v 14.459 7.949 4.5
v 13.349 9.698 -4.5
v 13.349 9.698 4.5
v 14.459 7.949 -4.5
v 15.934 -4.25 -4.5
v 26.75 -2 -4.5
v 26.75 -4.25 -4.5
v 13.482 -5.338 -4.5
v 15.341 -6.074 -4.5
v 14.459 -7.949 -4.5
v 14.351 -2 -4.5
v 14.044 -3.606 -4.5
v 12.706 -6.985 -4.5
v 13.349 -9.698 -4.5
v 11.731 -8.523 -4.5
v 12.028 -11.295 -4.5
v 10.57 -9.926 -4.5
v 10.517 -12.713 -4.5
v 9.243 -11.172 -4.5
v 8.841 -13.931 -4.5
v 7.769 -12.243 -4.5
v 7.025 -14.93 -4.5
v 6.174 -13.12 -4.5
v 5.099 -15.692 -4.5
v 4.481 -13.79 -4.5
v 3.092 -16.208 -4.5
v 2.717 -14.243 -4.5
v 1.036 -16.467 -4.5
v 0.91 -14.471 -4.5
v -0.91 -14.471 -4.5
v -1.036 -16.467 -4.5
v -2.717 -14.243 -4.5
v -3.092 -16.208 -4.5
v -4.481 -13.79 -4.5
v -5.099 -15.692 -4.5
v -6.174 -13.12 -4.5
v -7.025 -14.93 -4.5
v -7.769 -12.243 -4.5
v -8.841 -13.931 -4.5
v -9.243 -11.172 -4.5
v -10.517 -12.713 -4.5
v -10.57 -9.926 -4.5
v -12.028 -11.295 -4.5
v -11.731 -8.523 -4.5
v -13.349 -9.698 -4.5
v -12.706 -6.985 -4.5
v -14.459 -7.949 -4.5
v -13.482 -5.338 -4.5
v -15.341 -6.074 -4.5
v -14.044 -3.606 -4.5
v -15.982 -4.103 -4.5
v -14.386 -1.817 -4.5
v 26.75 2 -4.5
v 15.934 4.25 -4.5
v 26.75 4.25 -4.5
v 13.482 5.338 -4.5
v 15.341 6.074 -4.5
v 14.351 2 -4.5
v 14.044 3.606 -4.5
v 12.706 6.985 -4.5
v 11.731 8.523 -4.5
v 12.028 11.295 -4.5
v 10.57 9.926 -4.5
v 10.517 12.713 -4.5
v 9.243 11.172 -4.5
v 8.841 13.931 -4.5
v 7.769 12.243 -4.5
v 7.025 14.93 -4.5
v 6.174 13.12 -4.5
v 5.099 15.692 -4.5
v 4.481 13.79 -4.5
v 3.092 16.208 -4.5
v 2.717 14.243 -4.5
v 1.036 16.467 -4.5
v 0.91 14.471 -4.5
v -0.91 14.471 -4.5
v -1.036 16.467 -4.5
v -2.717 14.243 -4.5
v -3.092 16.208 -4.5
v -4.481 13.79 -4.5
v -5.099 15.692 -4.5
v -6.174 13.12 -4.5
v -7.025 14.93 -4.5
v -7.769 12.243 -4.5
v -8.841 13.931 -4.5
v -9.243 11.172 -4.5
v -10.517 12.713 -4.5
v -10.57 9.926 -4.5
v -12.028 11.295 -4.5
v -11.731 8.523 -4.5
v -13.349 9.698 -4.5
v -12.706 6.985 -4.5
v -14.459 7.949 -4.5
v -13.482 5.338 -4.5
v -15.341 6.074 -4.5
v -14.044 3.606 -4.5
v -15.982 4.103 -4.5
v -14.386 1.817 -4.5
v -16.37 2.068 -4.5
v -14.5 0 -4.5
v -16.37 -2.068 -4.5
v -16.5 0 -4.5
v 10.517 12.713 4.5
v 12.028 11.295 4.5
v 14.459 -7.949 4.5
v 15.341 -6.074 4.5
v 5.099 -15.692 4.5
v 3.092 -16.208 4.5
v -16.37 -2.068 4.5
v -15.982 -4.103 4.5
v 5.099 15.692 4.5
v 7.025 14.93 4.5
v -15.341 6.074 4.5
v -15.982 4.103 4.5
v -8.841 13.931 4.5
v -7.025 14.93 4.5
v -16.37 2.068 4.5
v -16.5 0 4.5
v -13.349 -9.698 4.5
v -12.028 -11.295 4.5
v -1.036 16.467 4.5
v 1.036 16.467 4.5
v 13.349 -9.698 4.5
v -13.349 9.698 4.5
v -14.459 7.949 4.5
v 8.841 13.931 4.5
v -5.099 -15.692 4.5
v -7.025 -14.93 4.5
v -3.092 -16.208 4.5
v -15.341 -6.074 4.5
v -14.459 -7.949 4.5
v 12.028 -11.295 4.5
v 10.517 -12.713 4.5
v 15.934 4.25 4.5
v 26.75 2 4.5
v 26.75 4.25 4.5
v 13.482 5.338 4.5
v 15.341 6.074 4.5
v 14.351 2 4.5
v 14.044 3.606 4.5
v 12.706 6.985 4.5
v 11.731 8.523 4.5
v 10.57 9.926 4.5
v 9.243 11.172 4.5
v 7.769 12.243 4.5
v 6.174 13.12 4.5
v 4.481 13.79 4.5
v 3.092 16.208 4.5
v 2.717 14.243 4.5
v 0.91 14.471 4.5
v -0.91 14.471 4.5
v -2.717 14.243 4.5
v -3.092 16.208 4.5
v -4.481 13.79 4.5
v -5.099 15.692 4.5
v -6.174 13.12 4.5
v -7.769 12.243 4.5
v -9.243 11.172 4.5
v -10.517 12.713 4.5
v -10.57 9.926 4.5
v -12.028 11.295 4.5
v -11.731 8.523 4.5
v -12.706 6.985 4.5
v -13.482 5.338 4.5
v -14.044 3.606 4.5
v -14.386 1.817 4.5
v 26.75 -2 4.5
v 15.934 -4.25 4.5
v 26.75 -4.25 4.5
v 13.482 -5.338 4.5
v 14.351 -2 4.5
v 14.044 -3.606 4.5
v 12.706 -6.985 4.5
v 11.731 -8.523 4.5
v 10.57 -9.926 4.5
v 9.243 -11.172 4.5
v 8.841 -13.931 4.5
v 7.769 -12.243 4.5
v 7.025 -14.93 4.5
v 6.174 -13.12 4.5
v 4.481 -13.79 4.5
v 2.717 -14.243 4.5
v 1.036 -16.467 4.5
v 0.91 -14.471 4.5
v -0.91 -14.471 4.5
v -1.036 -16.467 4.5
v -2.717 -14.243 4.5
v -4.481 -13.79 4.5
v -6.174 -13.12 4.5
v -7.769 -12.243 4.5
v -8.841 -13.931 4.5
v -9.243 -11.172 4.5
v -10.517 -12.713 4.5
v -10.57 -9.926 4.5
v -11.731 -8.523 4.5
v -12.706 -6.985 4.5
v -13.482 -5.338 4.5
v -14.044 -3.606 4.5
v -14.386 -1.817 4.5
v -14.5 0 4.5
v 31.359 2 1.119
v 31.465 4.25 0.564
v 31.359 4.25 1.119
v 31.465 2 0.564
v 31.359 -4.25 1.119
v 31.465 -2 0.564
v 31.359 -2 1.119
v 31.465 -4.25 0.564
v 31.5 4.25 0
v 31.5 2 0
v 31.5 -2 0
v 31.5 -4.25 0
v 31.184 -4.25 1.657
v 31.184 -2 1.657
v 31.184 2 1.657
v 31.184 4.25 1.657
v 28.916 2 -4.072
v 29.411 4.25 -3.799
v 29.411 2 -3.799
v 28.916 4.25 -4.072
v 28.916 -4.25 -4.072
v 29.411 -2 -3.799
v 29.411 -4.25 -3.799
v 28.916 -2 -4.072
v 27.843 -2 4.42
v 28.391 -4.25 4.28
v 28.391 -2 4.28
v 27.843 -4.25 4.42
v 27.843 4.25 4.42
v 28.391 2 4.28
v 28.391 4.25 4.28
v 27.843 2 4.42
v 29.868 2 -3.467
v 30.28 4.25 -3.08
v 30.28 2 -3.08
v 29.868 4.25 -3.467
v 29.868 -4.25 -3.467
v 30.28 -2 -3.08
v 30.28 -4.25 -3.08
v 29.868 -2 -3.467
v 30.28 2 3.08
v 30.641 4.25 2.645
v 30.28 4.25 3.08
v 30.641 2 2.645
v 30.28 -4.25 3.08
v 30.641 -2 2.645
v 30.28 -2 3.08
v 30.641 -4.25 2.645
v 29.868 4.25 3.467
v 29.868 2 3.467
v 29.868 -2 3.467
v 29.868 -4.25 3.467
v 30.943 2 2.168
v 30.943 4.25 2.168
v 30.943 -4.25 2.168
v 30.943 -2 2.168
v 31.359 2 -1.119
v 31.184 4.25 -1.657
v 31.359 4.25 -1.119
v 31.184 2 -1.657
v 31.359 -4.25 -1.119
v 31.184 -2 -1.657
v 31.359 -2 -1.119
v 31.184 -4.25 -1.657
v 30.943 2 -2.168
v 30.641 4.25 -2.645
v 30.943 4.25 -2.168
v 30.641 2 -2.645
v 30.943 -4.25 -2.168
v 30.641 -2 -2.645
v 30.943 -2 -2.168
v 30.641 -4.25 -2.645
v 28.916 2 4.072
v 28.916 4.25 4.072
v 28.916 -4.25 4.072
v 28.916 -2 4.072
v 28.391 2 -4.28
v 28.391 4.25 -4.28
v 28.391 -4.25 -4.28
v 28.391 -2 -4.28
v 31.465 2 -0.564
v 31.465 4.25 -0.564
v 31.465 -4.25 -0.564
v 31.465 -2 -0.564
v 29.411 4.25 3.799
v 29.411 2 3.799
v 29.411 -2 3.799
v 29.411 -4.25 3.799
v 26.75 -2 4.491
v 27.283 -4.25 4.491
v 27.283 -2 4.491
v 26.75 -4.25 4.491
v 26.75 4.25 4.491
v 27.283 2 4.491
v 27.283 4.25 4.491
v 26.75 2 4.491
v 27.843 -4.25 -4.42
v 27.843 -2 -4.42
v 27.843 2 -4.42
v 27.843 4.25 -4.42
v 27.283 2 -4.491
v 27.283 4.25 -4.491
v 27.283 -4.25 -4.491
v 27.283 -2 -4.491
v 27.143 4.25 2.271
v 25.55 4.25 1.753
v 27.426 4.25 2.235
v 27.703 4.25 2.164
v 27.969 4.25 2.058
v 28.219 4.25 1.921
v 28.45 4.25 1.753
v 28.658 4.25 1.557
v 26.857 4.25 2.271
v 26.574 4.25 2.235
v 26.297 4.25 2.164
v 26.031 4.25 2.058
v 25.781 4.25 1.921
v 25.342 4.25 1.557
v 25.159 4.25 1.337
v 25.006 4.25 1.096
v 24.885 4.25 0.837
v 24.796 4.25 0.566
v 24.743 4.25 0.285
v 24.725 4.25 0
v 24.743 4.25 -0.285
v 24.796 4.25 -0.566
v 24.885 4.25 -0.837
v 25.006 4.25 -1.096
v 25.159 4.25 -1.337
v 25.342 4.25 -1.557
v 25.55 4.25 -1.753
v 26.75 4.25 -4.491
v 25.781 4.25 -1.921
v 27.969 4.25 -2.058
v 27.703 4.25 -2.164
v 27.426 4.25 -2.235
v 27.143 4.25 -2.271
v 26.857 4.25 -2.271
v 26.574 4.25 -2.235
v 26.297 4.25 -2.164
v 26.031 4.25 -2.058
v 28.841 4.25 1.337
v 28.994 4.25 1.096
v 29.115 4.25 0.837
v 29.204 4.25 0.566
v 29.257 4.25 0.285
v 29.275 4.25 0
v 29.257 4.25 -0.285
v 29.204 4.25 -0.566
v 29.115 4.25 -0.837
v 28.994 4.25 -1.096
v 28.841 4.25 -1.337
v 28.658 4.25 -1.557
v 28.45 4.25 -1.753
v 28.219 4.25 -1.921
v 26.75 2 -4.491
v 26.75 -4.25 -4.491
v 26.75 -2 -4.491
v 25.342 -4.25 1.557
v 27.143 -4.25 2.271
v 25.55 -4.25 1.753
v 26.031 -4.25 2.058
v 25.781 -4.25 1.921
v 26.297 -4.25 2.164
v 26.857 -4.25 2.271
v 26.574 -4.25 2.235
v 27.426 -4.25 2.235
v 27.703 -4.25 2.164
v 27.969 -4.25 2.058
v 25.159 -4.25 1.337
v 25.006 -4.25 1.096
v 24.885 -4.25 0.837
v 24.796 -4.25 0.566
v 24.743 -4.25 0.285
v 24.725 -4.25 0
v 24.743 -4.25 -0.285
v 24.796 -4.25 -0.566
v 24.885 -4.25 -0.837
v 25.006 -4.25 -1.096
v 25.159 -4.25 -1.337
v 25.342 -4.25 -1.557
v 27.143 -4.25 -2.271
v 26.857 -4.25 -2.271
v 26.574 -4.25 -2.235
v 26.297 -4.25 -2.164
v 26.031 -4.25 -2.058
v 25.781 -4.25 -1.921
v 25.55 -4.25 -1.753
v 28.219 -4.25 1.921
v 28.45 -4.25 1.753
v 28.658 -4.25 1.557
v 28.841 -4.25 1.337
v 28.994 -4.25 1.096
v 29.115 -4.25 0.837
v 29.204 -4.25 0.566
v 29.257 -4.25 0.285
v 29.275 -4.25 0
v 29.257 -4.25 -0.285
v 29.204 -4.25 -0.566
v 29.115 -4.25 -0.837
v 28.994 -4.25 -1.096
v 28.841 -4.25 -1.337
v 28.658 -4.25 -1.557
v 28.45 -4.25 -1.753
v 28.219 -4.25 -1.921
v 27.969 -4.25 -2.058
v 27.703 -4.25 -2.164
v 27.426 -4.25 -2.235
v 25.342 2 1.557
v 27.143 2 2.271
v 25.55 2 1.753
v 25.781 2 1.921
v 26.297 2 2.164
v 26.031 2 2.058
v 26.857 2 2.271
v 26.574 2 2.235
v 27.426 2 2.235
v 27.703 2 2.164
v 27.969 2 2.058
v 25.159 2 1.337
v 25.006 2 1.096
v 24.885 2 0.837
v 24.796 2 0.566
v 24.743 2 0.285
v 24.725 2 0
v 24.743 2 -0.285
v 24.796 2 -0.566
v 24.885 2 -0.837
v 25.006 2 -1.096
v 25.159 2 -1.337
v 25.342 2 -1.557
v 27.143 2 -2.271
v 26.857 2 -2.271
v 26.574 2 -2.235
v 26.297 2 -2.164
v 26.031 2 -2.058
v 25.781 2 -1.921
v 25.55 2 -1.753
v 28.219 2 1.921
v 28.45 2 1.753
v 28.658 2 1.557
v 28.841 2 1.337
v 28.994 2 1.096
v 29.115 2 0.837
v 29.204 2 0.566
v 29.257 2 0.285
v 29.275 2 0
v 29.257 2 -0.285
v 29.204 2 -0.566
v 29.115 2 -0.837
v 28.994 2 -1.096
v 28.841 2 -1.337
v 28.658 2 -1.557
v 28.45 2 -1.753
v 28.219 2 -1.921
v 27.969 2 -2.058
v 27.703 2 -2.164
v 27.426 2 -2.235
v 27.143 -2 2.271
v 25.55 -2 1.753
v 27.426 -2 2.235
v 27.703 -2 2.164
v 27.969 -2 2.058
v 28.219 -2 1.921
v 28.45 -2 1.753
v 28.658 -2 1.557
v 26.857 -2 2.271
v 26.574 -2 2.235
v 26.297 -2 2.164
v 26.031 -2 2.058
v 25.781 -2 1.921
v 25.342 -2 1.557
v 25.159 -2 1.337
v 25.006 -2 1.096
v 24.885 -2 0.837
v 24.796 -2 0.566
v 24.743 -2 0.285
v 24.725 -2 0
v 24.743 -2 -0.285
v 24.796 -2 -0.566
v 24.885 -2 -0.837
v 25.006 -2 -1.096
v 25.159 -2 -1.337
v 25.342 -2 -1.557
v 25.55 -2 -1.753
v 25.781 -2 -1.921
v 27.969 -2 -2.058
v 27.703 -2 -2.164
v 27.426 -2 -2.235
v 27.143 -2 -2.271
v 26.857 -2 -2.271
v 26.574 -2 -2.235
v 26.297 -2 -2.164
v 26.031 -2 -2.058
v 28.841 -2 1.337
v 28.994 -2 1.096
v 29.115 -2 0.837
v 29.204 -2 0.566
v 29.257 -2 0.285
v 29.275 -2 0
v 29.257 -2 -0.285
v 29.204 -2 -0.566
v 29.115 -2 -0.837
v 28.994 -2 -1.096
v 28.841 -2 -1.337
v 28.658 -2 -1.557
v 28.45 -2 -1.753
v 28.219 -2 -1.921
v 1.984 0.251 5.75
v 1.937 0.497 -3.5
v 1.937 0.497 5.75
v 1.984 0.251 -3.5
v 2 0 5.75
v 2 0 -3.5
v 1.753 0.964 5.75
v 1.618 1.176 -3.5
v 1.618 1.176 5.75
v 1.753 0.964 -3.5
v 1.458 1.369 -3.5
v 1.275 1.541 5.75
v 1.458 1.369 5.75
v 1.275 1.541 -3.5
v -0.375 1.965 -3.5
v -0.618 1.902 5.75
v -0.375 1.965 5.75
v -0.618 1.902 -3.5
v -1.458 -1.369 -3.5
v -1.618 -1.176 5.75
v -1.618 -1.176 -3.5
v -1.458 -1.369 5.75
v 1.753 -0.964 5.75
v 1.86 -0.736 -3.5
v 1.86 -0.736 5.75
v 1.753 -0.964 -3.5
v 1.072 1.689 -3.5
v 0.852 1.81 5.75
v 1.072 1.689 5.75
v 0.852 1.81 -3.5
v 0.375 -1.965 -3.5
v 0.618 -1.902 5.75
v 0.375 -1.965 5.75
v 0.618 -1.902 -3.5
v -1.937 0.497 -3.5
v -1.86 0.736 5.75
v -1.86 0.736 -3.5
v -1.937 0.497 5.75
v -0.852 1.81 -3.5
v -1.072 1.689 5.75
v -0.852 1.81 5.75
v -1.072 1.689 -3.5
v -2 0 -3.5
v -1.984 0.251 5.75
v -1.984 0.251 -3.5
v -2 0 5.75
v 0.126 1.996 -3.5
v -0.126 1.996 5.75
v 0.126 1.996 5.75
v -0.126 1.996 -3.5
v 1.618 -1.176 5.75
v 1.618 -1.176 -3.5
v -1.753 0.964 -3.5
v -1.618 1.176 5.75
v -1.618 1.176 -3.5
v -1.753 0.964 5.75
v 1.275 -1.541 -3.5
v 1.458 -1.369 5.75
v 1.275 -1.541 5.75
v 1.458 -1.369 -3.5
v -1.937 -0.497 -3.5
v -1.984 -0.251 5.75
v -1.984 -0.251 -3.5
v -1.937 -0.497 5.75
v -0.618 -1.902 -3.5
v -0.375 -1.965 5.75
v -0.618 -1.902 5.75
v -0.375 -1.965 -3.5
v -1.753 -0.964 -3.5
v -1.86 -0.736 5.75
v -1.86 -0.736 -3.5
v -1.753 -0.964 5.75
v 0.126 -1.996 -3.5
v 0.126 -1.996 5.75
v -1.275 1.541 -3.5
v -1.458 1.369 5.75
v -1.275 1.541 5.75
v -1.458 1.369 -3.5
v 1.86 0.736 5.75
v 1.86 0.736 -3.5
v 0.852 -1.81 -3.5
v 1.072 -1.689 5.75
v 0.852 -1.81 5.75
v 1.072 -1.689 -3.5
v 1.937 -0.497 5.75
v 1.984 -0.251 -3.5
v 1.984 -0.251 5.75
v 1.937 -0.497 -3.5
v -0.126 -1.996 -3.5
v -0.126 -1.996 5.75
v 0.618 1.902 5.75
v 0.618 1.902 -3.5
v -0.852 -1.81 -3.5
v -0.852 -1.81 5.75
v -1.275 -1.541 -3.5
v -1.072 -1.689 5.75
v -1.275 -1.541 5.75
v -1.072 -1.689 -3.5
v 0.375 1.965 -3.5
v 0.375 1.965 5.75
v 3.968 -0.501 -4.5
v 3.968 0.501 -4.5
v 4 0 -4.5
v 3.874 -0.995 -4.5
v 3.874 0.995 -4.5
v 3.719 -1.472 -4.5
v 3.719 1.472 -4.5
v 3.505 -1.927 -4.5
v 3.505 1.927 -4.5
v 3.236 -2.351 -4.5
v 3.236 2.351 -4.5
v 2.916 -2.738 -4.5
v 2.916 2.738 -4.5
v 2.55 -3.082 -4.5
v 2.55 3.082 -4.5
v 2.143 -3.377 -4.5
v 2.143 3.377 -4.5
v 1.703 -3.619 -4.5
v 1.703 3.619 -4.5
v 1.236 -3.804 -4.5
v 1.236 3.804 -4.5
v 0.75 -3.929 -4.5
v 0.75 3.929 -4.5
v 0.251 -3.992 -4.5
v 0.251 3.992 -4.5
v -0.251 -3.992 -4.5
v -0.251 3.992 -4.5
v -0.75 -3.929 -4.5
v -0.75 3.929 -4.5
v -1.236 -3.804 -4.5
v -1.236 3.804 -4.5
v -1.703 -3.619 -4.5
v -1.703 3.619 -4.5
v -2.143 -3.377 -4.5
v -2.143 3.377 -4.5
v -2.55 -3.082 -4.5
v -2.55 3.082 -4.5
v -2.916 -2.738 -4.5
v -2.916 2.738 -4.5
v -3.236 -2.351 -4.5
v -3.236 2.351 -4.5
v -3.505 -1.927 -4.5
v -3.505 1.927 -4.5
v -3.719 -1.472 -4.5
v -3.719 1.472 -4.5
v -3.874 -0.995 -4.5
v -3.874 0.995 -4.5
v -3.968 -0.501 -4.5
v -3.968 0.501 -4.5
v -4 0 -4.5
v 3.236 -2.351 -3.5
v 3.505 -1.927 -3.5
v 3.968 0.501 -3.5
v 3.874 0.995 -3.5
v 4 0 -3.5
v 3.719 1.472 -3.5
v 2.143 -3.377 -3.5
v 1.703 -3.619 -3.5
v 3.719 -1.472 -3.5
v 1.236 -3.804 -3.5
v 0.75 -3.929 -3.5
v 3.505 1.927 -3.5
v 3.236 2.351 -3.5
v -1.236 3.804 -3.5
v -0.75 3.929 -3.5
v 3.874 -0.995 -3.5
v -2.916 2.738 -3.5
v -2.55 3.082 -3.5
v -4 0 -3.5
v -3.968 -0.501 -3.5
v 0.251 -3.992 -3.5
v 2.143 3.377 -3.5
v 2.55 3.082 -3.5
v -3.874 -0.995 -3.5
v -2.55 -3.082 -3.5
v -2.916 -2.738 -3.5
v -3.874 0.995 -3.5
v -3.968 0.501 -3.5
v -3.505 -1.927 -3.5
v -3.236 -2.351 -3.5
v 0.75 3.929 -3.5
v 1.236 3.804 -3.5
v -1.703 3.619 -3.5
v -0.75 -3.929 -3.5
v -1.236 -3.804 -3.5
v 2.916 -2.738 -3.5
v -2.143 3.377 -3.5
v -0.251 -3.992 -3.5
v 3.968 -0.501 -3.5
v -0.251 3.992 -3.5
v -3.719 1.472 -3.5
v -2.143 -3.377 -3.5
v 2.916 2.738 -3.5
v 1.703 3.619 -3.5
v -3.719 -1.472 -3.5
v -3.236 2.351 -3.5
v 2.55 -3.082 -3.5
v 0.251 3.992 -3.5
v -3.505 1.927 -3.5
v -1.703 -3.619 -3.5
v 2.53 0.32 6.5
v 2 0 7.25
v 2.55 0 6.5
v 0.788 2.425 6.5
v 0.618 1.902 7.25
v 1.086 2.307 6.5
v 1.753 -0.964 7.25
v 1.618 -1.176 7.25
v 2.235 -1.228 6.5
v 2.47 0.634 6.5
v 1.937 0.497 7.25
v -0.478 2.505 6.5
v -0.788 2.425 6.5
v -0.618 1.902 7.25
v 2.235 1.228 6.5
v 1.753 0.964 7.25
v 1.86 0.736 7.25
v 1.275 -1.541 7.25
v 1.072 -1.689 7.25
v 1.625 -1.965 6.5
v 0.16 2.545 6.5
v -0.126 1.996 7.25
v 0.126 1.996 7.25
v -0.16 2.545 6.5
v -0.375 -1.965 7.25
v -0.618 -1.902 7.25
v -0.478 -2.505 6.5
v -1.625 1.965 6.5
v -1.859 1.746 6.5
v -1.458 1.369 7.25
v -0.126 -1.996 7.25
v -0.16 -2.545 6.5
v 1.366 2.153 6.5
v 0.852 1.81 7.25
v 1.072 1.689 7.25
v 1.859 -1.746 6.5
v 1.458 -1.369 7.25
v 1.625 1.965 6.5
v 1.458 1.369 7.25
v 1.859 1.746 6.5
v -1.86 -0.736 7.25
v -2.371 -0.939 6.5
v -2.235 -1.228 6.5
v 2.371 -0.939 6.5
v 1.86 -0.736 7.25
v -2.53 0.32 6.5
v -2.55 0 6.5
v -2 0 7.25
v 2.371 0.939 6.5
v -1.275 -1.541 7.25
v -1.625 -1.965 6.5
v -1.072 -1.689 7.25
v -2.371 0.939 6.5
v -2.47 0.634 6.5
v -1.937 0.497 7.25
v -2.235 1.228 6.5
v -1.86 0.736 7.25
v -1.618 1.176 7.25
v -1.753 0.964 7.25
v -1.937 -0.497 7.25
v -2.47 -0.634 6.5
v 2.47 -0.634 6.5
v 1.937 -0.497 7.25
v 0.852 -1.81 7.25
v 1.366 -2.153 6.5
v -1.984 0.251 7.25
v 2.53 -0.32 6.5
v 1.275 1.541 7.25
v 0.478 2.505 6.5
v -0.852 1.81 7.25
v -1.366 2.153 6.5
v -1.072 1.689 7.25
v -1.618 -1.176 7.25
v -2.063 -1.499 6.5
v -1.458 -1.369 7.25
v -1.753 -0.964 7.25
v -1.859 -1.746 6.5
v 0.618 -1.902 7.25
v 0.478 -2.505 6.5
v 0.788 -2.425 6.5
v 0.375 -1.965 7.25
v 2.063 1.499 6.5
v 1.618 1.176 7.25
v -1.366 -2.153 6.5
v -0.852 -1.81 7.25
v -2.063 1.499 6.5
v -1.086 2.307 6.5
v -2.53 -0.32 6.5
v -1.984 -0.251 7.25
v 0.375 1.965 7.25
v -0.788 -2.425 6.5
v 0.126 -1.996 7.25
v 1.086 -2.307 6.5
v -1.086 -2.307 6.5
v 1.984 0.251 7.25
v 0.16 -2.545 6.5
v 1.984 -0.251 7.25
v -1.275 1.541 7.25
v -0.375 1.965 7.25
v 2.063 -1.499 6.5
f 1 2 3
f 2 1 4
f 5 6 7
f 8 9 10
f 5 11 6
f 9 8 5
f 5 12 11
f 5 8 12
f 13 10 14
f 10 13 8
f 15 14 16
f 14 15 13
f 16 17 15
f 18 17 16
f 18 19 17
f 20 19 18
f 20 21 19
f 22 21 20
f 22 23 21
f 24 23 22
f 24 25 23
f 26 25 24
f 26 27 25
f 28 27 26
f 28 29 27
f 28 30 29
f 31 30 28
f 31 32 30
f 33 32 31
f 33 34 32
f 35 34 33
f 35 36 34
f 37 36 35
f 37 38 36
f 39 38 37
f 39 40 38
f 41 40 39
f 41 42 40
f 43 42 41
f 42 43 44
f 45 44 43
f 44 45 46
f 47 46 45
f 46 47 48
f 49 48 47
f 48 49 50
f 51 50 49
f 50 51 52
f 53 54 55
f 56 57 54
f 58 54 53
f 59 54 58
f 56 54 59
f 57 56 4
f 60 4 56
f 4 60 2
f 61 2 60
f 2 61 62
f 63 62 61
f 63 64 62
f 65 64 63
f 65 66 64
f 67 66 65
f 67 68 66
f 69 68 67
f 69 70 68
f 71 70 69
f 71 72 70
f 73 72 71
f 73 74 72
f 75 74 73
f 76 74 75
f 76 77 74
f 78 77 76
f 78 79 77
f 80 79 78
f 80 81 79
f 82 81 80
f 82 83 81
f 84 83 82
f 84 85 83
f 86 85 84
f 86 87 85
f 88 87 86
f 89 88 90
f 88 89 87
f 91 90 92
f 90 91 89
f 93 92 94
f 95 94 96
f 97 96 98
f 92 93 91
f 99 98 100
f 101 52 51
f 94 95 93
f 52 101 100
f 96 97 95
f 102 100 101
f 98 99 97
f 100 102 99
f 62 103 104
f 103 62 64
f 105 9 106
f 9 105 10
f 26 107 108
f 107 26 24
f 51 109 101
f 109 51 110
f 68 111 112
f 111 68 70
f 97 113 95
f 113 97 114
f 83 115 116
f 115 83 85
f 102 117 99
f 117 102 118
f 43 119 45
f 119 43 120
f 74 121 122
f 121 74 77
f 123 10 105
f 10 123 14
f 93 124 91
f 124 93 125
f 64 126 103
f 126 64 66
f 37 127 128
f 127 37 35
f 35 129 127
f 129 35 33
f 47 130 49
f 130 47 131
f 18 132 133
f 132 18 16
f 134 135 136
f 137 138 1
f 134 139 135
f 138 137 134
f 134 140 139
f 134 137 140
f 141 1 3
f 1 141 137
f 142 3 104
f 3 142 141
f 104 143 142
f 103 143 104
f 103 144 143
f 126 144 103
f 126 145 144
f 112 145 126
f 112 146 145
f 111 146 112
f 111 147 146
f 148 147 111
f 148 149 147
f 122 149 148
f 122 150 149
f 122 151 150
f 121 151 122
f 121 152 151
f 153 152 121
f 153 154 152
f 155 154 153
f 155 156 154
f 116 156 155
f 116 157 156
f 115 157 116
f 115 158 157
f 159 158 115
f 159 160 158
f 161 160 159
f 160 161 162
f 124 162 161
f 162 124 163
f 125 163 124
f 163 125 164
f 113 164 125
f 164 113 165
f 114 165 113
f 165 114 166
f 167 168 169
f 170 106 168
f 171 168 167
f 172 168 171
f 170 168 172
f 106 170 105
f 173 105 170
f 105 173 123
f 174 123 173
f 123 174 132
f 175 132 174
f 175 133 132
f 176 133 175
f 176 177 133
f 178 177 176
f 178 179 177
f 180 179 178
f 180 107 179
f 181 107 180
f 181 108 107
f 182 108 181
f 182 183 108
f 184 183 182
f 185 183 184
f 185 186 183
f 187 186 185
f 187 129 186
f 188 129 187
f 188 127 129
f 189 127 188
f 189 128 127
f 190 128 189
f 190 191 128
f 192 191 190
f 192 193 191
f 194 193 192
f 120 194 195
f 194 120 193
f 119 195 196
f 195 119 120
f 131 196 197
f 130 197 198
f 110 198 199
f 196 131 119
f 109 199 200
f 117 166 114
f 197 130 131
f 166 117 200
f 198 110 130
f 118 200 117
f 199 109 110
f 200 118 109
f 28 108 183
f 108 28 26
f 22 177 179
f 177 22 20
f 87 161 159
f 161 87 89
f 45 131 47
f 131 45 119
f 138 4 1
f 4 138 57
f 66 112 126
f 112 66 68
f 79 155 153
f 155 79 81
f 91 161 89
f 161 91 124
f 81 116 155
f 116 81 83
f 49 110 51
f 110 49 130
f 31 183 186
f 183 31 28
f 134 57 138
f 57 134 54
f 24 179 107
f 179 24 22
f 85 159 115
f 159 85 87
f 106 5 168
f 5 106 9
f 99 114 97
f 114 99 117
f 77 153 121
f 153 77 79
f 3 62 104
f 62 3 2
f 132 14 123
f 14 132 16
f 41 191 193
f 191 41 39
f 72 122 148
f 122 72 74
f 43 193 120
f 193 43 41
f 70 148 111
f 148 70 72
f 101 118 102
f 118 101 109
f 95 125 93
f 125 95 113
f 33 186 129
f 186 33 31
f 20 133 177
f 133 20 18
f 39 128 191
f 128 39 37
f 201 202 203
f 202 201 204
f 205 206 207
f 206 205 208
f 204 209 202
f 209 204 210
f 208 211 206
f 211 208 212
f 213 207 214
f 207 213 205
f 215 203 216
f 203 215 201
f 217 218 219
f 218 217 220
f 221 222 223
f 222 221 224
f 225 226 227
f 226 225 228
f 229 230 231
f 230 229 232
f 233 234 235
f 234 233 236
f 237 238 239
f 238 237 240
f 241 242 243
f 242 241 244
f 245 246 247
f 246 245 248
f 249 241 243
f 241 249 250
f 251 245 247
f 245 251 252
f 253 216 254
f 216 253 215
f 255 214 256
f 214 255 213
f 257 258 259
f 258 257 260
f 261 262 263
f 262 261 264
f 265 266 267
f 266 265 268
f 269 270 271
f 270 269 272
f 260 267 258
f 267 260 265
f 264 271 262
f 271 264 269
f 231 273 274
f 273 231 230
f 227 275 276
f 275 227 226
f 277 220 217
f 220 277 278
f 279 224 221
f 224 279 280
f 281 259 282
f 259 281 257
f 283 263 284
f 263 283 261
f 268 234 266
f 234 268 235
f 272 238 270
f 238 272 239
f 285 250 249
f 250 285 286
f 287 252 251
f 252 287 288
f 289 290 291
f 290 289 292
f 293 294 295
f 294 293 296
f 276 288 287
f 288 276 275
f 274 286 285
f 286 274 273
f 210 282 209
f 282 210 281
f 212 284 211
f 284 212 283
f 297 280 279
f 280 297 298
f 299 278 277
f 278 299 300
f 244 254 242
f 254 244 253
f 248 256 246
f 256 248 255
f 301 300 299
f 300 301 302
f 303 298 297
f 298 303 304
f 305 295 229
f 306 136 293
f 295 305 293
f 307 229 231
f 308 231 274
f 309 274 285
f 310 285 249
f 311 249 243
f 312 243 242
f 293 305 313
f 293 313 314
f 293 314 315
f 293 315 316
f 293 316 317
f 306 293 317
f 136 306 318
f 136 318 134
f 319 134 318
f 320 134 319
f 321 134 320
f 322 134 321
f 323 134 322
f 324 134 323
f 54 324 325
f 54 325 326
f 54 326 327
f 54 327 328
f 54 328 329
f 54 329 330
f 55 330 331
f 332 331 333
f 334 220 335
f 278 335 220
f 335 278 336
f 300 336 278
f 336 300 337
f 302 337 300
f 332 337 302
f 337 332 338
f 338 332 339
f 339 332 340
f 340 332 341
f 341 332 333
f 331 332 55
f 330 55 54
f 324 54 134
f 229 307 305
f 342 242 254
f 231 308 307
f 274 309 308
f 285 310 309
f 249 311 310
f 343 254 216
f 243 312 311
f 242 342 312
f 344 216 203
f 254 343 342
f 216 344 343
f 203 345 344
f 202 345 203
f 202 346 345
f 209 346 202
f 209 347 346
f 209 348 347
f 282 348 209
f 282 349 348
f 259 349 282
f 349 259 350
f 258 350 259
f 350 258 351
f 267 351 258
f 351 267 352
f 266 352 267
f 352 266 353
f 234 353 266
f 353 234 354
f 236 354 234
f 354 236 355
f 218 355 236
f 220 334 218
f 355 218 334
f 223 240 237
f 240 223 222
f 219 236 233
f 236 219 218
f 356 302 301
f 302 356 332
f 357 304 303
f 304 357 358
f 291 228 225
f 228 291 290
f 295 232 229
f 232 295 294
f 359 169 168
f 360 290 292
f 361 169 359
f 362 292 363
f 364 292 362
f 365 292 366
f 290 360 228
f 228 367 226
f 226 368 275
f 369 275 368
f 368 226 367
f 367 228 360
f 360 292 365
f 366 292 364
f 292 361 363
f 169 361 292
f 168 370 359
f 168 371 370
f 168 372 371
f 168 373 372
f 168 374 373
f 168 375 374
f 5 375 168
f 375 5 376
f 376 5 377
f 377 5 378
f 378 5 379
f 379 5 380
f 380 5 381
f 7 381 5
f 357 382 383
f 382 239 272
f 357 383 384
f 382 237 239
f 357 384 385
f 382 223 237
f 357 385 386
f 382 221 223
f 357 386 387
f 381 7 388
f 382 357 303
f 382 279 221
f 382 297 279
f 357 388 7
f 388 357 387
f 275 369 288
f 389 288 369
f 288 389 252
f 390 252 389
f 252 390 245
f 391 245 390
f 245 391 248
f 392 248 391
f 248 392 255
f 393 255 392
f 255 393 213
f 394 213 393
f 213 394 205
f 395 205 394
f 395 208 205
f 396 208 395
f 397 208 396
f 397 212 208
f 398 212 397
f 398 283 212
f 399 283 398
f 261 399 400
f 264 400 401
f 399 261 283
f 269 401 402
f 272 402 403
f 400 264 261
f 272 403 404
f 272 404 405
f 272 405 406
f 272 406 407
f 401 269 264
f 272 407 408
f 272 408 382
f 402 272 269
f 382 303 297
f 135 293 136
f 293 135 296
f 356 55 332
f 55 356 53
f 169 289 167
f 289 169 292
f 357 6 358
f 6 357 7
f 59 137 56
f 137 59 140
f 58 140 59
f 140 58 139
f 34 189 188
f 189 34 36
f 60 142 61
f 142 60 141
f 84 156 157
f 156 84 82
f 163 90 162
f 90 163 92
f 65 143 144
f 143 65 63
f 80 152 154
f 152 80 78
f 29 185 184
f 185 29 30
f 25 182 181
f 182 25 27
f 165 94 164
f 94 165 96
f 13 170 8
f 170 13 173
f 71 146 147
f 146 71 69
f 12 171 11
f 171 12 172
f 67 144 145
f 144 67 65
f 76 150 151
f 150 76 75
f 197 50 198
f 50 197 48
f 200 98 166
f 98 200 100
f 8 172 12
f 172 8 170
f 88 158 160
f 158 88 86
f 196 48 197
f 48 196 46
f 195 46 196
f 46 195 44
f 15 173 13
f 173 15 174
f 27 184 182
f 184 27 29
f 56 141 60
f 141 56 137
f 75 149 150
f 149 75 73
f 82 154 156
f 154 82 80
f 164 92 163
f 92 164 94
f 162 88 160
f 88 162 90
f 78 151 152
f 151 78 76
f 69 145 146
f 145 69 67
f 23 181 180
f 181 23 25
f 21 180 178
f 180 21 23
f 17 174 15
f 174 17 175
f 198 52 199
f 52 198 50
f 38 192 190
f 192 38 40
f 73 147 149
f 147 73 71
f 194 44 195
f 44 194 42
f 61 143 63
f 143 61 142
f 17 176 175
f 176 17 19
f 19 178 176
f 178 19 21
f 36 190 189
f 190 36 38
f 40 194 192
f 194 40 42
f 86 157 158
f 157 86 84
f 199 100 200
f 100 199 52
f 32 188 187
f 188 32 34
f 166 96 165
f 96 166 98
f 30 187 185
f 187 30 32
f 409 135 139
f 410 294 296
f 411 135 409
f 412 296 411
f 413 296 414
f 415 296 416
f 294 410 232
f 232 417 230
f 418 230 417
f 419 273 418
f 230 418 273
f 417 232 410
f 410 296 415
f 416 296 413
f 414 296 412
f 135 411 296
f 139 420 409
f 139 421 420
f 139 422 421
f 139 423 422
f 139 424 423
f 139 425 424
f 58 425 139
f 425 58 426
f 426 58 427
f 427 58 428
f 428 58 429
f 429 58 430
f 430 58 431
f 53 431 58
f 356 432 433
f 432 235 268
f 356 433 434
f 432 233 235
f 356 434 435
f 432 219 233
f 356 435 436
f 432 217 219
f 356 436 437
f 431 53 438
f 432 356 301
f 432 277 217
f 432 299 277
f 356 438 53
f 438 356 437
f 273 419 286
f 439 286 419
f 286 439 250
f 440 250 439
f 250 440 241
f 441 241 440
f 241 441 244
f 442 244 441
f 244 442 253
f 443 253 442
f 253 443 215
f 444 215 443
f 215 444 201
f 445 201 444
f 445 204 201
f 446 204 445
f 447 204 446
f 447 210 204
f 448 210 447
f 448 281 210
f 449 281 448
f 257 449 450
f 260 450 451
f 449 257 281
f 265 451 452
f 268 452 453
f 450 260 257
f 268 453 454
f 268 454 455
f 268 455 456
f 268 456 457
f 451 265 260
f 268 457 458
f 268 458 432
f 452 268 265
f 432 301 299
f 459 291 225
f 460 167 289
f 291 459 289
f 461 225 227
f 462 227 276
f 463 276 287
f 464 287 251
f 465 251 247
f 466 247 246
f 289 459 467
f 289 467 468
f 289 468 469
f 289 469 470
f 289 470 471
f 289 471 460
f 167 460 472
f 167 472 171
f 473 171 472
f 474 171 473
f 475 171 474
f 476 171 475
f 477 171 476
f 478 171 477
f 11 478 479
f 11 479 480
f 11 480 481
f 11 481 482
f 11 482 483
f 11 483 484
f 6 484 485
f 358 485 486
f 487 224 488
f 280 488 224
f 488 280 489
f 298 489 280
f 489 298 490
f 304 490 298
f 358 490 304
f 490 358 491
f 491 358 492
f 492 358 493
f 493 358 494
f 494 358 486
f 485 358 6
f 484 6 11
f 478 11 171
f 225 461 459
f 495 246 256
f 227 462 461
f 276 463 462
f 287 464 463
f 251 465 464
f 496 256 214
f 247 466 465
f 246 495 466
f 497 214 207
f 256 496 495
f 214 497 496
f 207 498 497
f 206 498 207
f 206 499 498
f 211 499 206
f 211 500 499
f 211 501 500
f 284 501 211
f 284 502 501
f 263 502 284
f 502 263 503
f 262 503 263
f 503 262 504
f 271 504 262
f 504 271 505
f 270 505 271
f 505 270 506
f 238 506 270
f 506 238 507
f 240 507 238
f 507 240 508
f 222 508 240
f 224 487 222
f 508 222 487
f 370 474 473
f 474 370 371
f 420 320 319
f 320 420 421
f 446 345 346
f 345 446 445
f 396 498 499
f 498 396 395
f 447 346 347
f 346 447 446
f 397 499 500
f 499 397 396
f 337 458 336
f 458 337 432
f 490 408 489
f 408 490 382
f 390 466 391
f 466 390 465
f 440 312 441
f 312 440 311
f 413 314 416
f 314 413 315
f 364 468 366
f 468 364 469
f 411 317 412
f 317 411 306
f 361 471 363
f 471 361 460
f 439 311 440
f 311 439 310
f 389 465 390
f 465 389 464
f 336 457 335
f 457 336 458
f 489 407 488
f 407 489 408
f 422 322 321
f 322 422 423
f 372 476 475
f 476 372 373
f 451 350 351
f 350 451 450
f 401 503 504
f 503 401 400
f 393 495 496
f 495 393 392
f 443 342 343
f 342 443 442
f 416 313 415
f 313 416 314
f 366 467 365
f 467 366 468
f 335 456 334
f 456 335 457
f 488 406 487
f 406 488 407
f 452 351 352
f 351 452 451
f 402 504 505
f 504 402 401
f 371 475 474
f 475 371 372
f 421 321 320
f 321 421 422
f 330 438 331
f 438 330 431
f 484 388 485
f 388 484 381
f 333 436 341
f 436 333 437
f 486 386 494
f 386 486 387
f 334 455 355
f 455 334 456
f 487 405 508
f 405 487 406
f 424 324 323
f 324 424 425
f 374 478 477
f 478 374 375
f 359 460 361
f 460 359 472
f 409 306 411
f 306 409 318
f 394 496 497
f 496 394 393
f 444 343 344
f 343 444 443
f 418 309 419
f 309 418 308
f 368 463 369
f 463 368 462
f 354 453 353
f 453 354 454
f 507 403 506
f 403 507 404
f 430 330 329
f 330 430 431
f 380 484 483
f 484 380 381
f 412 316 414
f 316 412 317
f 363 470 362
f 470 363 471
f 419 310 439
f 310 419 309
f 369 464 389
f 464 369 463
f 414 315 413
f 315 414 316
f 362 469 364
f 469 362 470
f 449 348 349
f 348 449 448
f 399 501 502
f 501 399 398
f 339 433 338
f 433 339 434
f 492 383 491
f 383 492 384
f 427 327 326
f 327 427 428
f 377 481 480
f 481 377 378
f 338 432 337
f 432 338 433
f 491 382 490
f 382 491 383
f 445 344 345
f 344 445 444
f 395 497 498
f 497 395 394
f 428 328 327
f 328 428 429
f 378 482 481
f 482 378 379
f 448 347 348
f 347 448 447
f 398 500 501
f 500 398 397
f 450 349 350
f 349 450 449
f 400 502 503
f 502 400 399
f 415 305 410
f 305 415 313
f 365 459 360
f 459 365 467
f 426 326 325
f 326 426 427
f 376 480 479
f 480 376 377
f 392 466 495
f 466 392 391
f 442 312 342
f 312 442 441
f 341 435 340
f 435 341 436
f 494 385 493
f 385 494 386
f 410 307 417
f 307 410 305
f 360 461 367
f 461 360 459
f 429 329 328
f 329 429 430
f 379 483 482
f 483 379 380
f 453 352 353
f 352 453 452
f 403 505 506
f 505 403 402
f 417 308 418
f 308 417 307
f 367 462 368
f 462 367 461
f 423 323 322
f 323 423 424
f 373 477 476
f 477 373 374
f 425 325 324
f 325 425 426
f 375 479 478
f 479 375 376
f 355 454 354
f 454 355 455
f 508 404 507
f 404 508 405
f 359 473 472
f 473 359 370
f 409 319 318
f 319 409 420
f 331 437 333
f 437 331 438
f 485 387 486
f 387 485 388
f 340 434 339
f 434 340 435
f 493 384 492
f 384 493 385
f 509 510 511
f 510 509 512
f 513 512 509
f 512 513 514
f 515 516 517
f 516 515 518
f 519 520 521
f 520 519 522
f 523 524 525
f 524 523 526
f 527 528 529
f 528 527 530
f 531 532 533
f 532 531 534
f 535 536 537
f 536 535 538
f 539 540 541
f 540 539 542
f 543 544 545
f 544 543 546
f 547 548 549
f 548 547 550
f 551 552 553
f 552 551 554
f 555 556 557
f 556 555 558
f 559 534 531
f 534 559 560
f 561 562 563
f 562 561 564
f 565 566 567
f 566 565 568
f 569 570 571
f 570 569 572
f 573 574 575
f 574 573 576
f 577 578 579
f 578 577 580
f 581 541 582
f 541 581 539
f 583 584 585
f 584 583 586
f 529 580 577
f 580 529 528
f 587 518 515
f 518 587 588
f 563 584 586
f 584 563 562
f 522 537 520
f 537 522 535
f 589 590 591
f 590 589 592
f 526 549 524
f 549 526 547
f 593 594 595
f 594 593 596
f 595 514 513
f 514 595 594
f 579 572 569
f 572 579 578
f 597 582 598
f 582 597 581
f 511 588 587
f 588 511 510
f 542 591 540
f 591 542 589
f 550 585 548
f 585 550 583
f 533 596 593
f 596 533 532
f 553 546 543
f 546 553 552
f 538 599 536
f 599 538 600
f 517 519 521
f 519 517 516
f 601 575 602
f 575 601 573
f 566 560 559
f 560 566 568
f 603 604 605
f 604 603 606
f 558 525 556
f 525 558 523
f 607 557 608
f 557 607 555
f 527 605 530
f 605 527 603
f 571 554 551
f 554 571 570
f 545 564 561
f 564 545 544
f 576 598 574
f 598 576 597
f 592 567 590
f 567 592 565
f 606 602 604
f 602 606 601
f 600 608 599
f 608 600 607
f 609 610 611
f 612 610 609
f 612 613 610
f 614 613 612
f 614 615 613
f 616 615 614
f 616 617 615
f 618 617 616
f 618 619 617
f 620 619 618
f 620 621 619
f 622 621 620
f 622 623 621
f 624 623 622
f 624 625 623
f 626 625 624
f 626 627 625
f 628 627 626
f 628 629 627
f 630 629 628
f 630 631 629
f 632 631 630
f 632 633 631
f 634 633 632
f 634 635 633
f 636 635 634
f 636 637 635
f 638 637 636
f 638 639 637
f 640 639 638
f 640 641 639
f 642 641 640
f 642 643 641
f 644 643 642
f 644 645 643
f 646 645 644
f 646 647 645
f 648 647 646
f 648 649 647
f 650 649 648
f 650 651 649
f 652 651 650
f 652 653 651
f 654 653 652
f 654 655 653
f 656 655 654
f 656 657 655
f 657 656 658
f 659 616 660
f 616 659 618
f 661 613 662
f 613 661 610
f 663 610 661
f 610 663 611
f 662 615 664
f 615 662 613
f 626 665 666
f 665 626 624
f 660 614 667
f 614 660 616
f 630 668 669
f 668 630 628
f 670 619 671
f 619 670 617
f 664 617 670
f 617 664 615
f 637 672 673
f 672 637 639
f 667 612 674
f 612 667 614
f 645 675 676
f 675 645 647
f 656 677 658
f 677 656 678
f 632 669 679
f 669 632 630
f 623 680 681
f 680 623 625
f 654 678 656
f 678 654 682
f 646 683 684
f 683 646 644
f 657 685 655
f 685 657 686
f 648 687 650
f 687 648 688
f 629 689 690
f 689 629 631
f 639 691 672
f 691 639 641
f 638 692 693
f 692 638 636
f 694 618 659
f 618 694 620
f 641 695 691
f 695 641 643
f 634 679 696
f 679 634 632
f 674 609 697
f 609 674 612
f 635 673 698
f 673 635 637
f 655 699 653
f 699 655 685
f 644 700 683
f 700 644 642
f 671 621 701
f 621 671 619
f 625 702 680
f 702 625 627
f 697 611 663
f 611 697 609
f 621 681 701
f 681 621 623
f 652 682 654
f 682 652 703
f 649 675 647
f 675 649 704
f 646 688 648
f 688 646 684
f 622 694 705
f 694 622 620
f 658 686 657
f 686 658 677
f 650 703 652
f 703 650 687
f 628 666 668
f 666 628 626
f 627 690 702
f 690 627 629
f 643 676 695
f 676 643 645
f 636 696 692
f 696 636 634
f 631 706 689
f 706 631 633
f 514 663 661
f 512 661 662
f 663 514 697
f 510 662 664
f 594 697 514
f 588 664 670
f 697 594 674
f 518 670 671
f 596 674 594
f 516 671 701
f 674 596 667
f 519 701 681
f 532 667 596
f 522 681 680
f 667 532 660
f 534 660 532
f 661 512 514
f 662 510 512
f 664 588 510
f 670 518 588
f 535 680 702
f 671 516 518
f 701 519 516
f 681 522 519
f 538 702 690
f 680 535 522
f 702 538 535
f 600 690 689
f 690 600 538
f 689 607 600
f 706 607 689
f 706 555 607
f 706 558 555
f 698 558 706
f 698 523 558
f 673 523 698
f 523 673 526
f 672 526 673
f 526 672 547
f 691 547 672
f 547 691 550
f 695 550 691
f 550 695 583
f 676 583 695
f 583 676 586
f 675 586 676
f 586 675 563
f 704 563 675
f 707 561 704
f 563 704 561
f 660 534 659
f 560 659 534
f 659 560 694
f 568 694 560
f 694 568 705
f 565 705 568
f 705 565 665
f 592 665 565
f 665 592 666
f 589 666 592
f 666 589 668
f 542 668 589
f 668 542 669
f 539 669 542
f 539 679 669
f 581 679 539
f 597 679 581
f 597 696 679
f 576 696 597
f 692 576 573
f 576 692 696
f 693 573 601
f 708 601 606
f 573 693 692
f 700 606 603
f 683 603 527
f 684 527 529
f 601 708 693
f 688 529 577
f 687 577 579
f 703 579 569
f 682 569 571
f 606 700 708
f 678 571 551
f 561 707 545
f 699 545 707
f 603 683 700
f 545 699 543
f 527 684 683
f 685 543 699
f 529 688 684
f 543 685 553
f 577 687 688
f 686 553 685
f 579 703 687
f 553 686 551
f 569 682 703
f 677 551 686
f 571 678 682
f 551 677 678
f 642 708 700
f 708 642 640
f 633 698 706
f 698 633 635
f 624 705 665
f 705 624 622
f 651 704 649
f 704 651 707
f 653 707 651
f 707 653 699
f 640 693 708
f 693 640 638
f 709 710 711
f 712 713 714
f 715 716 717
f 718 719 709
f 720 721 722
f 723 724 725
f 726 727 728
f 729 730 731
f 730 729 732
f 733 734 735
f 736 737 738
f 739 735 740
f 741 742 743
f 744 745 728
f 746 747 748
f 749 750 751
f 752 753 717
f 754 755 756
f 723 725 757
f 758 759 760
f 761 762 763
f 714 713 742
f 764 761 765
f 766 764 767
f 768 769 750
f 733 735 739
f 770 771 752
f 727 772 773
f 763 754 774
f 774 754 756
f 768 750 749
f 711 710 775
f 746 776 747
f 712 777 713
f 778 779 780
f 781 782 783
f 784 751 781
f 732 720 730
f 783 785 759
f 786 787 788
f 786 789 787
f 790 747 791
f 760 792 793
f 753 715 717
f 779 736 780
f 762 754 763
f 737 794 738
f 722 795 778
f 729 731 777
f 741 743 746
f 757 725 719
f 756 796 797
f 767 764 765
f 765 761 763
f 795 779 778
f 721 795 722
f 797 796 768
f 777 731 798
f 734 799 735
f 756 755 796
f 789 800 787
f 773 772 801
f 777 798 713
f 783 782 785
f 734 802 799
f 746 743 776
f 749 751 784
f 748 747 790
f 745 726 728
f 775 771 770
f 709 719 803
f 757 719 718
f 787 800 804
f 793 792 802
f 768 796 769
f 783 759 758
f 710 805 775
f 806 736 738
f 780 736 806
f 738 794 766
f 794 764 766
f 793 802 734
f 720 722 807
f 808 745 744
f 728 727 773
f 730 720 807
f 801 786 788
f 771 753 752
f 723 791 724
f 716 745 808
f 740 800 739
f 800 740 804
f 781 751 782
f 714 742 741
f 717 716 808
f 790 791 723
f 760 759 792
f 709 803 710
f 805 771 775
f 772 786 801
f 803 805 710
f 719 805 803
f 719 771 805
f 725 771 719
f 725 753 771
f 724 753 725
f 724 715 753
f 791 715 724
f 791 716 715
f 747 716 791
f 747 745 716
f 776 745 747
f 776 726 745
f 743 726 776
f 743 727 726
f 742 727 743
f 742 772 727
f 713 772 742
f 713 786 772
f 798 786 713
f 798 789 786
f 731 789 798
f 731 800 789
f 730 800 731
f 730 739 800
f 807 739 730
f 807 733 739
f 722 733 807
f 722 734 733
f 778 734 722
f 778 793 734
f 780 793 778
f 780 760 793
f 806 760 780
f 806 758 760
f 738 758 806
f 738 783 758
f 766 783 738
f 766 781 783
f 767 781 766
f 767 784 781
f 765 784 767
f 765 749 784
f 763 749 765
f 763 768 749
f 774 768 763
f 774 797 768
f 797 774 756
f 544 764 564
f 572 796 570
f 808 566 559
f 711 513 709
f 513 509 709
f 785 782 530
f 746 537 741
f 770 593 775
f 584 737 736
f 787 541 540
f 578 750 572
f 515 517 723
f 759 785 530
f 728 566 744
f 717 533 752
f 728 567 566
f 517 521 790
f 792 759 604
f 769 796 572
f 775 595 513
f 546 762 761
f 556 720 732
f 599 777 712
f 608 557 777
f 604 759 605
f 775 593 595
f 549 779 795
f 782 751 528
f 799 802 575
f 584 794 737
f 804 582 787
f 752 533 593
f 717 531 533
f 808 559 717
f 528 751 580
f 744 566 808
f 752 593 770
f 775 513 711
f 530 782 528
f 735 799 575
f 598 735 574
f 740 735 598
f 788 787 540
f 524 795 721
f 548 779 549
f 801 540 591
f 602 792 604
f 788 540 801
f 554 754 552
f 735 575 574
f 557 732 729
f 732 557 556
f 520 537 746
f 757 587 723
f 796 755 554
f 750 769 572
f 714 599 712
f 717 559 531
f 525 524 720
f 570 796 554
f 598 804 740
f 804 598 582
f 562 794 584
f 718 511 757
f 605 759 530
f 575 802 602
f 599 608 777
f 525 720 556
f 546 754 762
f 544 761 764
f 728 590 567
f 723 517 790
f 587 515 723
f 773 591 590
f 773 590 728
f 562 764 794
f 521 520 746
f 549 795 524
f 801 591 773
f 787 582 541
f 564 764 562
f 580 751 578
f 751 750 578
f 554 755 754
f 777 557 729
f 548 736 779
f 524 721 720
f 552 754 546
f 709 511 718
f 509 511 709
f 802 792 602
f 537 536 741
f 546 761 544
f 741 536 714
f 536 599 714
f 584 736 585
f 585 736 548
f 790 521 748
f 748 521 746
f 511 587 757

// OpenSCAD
ringwidth=9;
ringinner=29;
ringouter=33;

support_len=16;
slotwidth=4;

pinlength=11;
pindia=4;
pinhead=1;
pinlock=1.5;
pincase=pinlength-pinhead-pinlock;
pinbump=.55;


$fn=50;
module splitring()
{
  difference()
  {
    union()
    {
      cylinder(r=ringouter/2,h=ringwidth, center=true);
      translate([ringouter/2+support_len-ringwidth/2-1,pincase/2,0])
        rotate([90,0,0]) cylinder(r=ringwidth/2,h=pincase);
      translate([ringouter/2,0,0])
        cube([ringwidth+support_len-ringwidth/2,pincase,ringwidth], center=true);
    }
    translate(0,0,-1) cylinder(r=ringinner/2,h=ringwidth+2, center=true);
    // slice it
    translate([ringouter/2-1,0,-1])
      cube([(ringwidth+support_len)*2,slotwidth,ringwidth+2],center=true);
    // drill the pin hole
    translate([ringouter/2+support_len-ringwidth/2-1,pinlength/2+1,0])
      rotate([90,0,0]) cylinder(r=pindia/2+pinbump/2,h=pinlength+2);
  }
}

module pin()
{
  translate([0,0,-ringwidth/2])cylinder(r=pindia/2,h=pinlength);
  translate([0,0,-ringwidth/2]) cylinder(r=pindia,h=pinhead);
  translate([0,0,pinlength-ringwidth/2])
    cylinder(r1=pindia/2+pinbump,r2=pindia/2,h=pinlock/2);
  translate([0,0,pinlength-ringwidth/2-pinlock/2])
    cylinder(r2=pindia/2+pinbump,r1=pindia/2,h=pinlock/2);
}

splitring();
pin();
